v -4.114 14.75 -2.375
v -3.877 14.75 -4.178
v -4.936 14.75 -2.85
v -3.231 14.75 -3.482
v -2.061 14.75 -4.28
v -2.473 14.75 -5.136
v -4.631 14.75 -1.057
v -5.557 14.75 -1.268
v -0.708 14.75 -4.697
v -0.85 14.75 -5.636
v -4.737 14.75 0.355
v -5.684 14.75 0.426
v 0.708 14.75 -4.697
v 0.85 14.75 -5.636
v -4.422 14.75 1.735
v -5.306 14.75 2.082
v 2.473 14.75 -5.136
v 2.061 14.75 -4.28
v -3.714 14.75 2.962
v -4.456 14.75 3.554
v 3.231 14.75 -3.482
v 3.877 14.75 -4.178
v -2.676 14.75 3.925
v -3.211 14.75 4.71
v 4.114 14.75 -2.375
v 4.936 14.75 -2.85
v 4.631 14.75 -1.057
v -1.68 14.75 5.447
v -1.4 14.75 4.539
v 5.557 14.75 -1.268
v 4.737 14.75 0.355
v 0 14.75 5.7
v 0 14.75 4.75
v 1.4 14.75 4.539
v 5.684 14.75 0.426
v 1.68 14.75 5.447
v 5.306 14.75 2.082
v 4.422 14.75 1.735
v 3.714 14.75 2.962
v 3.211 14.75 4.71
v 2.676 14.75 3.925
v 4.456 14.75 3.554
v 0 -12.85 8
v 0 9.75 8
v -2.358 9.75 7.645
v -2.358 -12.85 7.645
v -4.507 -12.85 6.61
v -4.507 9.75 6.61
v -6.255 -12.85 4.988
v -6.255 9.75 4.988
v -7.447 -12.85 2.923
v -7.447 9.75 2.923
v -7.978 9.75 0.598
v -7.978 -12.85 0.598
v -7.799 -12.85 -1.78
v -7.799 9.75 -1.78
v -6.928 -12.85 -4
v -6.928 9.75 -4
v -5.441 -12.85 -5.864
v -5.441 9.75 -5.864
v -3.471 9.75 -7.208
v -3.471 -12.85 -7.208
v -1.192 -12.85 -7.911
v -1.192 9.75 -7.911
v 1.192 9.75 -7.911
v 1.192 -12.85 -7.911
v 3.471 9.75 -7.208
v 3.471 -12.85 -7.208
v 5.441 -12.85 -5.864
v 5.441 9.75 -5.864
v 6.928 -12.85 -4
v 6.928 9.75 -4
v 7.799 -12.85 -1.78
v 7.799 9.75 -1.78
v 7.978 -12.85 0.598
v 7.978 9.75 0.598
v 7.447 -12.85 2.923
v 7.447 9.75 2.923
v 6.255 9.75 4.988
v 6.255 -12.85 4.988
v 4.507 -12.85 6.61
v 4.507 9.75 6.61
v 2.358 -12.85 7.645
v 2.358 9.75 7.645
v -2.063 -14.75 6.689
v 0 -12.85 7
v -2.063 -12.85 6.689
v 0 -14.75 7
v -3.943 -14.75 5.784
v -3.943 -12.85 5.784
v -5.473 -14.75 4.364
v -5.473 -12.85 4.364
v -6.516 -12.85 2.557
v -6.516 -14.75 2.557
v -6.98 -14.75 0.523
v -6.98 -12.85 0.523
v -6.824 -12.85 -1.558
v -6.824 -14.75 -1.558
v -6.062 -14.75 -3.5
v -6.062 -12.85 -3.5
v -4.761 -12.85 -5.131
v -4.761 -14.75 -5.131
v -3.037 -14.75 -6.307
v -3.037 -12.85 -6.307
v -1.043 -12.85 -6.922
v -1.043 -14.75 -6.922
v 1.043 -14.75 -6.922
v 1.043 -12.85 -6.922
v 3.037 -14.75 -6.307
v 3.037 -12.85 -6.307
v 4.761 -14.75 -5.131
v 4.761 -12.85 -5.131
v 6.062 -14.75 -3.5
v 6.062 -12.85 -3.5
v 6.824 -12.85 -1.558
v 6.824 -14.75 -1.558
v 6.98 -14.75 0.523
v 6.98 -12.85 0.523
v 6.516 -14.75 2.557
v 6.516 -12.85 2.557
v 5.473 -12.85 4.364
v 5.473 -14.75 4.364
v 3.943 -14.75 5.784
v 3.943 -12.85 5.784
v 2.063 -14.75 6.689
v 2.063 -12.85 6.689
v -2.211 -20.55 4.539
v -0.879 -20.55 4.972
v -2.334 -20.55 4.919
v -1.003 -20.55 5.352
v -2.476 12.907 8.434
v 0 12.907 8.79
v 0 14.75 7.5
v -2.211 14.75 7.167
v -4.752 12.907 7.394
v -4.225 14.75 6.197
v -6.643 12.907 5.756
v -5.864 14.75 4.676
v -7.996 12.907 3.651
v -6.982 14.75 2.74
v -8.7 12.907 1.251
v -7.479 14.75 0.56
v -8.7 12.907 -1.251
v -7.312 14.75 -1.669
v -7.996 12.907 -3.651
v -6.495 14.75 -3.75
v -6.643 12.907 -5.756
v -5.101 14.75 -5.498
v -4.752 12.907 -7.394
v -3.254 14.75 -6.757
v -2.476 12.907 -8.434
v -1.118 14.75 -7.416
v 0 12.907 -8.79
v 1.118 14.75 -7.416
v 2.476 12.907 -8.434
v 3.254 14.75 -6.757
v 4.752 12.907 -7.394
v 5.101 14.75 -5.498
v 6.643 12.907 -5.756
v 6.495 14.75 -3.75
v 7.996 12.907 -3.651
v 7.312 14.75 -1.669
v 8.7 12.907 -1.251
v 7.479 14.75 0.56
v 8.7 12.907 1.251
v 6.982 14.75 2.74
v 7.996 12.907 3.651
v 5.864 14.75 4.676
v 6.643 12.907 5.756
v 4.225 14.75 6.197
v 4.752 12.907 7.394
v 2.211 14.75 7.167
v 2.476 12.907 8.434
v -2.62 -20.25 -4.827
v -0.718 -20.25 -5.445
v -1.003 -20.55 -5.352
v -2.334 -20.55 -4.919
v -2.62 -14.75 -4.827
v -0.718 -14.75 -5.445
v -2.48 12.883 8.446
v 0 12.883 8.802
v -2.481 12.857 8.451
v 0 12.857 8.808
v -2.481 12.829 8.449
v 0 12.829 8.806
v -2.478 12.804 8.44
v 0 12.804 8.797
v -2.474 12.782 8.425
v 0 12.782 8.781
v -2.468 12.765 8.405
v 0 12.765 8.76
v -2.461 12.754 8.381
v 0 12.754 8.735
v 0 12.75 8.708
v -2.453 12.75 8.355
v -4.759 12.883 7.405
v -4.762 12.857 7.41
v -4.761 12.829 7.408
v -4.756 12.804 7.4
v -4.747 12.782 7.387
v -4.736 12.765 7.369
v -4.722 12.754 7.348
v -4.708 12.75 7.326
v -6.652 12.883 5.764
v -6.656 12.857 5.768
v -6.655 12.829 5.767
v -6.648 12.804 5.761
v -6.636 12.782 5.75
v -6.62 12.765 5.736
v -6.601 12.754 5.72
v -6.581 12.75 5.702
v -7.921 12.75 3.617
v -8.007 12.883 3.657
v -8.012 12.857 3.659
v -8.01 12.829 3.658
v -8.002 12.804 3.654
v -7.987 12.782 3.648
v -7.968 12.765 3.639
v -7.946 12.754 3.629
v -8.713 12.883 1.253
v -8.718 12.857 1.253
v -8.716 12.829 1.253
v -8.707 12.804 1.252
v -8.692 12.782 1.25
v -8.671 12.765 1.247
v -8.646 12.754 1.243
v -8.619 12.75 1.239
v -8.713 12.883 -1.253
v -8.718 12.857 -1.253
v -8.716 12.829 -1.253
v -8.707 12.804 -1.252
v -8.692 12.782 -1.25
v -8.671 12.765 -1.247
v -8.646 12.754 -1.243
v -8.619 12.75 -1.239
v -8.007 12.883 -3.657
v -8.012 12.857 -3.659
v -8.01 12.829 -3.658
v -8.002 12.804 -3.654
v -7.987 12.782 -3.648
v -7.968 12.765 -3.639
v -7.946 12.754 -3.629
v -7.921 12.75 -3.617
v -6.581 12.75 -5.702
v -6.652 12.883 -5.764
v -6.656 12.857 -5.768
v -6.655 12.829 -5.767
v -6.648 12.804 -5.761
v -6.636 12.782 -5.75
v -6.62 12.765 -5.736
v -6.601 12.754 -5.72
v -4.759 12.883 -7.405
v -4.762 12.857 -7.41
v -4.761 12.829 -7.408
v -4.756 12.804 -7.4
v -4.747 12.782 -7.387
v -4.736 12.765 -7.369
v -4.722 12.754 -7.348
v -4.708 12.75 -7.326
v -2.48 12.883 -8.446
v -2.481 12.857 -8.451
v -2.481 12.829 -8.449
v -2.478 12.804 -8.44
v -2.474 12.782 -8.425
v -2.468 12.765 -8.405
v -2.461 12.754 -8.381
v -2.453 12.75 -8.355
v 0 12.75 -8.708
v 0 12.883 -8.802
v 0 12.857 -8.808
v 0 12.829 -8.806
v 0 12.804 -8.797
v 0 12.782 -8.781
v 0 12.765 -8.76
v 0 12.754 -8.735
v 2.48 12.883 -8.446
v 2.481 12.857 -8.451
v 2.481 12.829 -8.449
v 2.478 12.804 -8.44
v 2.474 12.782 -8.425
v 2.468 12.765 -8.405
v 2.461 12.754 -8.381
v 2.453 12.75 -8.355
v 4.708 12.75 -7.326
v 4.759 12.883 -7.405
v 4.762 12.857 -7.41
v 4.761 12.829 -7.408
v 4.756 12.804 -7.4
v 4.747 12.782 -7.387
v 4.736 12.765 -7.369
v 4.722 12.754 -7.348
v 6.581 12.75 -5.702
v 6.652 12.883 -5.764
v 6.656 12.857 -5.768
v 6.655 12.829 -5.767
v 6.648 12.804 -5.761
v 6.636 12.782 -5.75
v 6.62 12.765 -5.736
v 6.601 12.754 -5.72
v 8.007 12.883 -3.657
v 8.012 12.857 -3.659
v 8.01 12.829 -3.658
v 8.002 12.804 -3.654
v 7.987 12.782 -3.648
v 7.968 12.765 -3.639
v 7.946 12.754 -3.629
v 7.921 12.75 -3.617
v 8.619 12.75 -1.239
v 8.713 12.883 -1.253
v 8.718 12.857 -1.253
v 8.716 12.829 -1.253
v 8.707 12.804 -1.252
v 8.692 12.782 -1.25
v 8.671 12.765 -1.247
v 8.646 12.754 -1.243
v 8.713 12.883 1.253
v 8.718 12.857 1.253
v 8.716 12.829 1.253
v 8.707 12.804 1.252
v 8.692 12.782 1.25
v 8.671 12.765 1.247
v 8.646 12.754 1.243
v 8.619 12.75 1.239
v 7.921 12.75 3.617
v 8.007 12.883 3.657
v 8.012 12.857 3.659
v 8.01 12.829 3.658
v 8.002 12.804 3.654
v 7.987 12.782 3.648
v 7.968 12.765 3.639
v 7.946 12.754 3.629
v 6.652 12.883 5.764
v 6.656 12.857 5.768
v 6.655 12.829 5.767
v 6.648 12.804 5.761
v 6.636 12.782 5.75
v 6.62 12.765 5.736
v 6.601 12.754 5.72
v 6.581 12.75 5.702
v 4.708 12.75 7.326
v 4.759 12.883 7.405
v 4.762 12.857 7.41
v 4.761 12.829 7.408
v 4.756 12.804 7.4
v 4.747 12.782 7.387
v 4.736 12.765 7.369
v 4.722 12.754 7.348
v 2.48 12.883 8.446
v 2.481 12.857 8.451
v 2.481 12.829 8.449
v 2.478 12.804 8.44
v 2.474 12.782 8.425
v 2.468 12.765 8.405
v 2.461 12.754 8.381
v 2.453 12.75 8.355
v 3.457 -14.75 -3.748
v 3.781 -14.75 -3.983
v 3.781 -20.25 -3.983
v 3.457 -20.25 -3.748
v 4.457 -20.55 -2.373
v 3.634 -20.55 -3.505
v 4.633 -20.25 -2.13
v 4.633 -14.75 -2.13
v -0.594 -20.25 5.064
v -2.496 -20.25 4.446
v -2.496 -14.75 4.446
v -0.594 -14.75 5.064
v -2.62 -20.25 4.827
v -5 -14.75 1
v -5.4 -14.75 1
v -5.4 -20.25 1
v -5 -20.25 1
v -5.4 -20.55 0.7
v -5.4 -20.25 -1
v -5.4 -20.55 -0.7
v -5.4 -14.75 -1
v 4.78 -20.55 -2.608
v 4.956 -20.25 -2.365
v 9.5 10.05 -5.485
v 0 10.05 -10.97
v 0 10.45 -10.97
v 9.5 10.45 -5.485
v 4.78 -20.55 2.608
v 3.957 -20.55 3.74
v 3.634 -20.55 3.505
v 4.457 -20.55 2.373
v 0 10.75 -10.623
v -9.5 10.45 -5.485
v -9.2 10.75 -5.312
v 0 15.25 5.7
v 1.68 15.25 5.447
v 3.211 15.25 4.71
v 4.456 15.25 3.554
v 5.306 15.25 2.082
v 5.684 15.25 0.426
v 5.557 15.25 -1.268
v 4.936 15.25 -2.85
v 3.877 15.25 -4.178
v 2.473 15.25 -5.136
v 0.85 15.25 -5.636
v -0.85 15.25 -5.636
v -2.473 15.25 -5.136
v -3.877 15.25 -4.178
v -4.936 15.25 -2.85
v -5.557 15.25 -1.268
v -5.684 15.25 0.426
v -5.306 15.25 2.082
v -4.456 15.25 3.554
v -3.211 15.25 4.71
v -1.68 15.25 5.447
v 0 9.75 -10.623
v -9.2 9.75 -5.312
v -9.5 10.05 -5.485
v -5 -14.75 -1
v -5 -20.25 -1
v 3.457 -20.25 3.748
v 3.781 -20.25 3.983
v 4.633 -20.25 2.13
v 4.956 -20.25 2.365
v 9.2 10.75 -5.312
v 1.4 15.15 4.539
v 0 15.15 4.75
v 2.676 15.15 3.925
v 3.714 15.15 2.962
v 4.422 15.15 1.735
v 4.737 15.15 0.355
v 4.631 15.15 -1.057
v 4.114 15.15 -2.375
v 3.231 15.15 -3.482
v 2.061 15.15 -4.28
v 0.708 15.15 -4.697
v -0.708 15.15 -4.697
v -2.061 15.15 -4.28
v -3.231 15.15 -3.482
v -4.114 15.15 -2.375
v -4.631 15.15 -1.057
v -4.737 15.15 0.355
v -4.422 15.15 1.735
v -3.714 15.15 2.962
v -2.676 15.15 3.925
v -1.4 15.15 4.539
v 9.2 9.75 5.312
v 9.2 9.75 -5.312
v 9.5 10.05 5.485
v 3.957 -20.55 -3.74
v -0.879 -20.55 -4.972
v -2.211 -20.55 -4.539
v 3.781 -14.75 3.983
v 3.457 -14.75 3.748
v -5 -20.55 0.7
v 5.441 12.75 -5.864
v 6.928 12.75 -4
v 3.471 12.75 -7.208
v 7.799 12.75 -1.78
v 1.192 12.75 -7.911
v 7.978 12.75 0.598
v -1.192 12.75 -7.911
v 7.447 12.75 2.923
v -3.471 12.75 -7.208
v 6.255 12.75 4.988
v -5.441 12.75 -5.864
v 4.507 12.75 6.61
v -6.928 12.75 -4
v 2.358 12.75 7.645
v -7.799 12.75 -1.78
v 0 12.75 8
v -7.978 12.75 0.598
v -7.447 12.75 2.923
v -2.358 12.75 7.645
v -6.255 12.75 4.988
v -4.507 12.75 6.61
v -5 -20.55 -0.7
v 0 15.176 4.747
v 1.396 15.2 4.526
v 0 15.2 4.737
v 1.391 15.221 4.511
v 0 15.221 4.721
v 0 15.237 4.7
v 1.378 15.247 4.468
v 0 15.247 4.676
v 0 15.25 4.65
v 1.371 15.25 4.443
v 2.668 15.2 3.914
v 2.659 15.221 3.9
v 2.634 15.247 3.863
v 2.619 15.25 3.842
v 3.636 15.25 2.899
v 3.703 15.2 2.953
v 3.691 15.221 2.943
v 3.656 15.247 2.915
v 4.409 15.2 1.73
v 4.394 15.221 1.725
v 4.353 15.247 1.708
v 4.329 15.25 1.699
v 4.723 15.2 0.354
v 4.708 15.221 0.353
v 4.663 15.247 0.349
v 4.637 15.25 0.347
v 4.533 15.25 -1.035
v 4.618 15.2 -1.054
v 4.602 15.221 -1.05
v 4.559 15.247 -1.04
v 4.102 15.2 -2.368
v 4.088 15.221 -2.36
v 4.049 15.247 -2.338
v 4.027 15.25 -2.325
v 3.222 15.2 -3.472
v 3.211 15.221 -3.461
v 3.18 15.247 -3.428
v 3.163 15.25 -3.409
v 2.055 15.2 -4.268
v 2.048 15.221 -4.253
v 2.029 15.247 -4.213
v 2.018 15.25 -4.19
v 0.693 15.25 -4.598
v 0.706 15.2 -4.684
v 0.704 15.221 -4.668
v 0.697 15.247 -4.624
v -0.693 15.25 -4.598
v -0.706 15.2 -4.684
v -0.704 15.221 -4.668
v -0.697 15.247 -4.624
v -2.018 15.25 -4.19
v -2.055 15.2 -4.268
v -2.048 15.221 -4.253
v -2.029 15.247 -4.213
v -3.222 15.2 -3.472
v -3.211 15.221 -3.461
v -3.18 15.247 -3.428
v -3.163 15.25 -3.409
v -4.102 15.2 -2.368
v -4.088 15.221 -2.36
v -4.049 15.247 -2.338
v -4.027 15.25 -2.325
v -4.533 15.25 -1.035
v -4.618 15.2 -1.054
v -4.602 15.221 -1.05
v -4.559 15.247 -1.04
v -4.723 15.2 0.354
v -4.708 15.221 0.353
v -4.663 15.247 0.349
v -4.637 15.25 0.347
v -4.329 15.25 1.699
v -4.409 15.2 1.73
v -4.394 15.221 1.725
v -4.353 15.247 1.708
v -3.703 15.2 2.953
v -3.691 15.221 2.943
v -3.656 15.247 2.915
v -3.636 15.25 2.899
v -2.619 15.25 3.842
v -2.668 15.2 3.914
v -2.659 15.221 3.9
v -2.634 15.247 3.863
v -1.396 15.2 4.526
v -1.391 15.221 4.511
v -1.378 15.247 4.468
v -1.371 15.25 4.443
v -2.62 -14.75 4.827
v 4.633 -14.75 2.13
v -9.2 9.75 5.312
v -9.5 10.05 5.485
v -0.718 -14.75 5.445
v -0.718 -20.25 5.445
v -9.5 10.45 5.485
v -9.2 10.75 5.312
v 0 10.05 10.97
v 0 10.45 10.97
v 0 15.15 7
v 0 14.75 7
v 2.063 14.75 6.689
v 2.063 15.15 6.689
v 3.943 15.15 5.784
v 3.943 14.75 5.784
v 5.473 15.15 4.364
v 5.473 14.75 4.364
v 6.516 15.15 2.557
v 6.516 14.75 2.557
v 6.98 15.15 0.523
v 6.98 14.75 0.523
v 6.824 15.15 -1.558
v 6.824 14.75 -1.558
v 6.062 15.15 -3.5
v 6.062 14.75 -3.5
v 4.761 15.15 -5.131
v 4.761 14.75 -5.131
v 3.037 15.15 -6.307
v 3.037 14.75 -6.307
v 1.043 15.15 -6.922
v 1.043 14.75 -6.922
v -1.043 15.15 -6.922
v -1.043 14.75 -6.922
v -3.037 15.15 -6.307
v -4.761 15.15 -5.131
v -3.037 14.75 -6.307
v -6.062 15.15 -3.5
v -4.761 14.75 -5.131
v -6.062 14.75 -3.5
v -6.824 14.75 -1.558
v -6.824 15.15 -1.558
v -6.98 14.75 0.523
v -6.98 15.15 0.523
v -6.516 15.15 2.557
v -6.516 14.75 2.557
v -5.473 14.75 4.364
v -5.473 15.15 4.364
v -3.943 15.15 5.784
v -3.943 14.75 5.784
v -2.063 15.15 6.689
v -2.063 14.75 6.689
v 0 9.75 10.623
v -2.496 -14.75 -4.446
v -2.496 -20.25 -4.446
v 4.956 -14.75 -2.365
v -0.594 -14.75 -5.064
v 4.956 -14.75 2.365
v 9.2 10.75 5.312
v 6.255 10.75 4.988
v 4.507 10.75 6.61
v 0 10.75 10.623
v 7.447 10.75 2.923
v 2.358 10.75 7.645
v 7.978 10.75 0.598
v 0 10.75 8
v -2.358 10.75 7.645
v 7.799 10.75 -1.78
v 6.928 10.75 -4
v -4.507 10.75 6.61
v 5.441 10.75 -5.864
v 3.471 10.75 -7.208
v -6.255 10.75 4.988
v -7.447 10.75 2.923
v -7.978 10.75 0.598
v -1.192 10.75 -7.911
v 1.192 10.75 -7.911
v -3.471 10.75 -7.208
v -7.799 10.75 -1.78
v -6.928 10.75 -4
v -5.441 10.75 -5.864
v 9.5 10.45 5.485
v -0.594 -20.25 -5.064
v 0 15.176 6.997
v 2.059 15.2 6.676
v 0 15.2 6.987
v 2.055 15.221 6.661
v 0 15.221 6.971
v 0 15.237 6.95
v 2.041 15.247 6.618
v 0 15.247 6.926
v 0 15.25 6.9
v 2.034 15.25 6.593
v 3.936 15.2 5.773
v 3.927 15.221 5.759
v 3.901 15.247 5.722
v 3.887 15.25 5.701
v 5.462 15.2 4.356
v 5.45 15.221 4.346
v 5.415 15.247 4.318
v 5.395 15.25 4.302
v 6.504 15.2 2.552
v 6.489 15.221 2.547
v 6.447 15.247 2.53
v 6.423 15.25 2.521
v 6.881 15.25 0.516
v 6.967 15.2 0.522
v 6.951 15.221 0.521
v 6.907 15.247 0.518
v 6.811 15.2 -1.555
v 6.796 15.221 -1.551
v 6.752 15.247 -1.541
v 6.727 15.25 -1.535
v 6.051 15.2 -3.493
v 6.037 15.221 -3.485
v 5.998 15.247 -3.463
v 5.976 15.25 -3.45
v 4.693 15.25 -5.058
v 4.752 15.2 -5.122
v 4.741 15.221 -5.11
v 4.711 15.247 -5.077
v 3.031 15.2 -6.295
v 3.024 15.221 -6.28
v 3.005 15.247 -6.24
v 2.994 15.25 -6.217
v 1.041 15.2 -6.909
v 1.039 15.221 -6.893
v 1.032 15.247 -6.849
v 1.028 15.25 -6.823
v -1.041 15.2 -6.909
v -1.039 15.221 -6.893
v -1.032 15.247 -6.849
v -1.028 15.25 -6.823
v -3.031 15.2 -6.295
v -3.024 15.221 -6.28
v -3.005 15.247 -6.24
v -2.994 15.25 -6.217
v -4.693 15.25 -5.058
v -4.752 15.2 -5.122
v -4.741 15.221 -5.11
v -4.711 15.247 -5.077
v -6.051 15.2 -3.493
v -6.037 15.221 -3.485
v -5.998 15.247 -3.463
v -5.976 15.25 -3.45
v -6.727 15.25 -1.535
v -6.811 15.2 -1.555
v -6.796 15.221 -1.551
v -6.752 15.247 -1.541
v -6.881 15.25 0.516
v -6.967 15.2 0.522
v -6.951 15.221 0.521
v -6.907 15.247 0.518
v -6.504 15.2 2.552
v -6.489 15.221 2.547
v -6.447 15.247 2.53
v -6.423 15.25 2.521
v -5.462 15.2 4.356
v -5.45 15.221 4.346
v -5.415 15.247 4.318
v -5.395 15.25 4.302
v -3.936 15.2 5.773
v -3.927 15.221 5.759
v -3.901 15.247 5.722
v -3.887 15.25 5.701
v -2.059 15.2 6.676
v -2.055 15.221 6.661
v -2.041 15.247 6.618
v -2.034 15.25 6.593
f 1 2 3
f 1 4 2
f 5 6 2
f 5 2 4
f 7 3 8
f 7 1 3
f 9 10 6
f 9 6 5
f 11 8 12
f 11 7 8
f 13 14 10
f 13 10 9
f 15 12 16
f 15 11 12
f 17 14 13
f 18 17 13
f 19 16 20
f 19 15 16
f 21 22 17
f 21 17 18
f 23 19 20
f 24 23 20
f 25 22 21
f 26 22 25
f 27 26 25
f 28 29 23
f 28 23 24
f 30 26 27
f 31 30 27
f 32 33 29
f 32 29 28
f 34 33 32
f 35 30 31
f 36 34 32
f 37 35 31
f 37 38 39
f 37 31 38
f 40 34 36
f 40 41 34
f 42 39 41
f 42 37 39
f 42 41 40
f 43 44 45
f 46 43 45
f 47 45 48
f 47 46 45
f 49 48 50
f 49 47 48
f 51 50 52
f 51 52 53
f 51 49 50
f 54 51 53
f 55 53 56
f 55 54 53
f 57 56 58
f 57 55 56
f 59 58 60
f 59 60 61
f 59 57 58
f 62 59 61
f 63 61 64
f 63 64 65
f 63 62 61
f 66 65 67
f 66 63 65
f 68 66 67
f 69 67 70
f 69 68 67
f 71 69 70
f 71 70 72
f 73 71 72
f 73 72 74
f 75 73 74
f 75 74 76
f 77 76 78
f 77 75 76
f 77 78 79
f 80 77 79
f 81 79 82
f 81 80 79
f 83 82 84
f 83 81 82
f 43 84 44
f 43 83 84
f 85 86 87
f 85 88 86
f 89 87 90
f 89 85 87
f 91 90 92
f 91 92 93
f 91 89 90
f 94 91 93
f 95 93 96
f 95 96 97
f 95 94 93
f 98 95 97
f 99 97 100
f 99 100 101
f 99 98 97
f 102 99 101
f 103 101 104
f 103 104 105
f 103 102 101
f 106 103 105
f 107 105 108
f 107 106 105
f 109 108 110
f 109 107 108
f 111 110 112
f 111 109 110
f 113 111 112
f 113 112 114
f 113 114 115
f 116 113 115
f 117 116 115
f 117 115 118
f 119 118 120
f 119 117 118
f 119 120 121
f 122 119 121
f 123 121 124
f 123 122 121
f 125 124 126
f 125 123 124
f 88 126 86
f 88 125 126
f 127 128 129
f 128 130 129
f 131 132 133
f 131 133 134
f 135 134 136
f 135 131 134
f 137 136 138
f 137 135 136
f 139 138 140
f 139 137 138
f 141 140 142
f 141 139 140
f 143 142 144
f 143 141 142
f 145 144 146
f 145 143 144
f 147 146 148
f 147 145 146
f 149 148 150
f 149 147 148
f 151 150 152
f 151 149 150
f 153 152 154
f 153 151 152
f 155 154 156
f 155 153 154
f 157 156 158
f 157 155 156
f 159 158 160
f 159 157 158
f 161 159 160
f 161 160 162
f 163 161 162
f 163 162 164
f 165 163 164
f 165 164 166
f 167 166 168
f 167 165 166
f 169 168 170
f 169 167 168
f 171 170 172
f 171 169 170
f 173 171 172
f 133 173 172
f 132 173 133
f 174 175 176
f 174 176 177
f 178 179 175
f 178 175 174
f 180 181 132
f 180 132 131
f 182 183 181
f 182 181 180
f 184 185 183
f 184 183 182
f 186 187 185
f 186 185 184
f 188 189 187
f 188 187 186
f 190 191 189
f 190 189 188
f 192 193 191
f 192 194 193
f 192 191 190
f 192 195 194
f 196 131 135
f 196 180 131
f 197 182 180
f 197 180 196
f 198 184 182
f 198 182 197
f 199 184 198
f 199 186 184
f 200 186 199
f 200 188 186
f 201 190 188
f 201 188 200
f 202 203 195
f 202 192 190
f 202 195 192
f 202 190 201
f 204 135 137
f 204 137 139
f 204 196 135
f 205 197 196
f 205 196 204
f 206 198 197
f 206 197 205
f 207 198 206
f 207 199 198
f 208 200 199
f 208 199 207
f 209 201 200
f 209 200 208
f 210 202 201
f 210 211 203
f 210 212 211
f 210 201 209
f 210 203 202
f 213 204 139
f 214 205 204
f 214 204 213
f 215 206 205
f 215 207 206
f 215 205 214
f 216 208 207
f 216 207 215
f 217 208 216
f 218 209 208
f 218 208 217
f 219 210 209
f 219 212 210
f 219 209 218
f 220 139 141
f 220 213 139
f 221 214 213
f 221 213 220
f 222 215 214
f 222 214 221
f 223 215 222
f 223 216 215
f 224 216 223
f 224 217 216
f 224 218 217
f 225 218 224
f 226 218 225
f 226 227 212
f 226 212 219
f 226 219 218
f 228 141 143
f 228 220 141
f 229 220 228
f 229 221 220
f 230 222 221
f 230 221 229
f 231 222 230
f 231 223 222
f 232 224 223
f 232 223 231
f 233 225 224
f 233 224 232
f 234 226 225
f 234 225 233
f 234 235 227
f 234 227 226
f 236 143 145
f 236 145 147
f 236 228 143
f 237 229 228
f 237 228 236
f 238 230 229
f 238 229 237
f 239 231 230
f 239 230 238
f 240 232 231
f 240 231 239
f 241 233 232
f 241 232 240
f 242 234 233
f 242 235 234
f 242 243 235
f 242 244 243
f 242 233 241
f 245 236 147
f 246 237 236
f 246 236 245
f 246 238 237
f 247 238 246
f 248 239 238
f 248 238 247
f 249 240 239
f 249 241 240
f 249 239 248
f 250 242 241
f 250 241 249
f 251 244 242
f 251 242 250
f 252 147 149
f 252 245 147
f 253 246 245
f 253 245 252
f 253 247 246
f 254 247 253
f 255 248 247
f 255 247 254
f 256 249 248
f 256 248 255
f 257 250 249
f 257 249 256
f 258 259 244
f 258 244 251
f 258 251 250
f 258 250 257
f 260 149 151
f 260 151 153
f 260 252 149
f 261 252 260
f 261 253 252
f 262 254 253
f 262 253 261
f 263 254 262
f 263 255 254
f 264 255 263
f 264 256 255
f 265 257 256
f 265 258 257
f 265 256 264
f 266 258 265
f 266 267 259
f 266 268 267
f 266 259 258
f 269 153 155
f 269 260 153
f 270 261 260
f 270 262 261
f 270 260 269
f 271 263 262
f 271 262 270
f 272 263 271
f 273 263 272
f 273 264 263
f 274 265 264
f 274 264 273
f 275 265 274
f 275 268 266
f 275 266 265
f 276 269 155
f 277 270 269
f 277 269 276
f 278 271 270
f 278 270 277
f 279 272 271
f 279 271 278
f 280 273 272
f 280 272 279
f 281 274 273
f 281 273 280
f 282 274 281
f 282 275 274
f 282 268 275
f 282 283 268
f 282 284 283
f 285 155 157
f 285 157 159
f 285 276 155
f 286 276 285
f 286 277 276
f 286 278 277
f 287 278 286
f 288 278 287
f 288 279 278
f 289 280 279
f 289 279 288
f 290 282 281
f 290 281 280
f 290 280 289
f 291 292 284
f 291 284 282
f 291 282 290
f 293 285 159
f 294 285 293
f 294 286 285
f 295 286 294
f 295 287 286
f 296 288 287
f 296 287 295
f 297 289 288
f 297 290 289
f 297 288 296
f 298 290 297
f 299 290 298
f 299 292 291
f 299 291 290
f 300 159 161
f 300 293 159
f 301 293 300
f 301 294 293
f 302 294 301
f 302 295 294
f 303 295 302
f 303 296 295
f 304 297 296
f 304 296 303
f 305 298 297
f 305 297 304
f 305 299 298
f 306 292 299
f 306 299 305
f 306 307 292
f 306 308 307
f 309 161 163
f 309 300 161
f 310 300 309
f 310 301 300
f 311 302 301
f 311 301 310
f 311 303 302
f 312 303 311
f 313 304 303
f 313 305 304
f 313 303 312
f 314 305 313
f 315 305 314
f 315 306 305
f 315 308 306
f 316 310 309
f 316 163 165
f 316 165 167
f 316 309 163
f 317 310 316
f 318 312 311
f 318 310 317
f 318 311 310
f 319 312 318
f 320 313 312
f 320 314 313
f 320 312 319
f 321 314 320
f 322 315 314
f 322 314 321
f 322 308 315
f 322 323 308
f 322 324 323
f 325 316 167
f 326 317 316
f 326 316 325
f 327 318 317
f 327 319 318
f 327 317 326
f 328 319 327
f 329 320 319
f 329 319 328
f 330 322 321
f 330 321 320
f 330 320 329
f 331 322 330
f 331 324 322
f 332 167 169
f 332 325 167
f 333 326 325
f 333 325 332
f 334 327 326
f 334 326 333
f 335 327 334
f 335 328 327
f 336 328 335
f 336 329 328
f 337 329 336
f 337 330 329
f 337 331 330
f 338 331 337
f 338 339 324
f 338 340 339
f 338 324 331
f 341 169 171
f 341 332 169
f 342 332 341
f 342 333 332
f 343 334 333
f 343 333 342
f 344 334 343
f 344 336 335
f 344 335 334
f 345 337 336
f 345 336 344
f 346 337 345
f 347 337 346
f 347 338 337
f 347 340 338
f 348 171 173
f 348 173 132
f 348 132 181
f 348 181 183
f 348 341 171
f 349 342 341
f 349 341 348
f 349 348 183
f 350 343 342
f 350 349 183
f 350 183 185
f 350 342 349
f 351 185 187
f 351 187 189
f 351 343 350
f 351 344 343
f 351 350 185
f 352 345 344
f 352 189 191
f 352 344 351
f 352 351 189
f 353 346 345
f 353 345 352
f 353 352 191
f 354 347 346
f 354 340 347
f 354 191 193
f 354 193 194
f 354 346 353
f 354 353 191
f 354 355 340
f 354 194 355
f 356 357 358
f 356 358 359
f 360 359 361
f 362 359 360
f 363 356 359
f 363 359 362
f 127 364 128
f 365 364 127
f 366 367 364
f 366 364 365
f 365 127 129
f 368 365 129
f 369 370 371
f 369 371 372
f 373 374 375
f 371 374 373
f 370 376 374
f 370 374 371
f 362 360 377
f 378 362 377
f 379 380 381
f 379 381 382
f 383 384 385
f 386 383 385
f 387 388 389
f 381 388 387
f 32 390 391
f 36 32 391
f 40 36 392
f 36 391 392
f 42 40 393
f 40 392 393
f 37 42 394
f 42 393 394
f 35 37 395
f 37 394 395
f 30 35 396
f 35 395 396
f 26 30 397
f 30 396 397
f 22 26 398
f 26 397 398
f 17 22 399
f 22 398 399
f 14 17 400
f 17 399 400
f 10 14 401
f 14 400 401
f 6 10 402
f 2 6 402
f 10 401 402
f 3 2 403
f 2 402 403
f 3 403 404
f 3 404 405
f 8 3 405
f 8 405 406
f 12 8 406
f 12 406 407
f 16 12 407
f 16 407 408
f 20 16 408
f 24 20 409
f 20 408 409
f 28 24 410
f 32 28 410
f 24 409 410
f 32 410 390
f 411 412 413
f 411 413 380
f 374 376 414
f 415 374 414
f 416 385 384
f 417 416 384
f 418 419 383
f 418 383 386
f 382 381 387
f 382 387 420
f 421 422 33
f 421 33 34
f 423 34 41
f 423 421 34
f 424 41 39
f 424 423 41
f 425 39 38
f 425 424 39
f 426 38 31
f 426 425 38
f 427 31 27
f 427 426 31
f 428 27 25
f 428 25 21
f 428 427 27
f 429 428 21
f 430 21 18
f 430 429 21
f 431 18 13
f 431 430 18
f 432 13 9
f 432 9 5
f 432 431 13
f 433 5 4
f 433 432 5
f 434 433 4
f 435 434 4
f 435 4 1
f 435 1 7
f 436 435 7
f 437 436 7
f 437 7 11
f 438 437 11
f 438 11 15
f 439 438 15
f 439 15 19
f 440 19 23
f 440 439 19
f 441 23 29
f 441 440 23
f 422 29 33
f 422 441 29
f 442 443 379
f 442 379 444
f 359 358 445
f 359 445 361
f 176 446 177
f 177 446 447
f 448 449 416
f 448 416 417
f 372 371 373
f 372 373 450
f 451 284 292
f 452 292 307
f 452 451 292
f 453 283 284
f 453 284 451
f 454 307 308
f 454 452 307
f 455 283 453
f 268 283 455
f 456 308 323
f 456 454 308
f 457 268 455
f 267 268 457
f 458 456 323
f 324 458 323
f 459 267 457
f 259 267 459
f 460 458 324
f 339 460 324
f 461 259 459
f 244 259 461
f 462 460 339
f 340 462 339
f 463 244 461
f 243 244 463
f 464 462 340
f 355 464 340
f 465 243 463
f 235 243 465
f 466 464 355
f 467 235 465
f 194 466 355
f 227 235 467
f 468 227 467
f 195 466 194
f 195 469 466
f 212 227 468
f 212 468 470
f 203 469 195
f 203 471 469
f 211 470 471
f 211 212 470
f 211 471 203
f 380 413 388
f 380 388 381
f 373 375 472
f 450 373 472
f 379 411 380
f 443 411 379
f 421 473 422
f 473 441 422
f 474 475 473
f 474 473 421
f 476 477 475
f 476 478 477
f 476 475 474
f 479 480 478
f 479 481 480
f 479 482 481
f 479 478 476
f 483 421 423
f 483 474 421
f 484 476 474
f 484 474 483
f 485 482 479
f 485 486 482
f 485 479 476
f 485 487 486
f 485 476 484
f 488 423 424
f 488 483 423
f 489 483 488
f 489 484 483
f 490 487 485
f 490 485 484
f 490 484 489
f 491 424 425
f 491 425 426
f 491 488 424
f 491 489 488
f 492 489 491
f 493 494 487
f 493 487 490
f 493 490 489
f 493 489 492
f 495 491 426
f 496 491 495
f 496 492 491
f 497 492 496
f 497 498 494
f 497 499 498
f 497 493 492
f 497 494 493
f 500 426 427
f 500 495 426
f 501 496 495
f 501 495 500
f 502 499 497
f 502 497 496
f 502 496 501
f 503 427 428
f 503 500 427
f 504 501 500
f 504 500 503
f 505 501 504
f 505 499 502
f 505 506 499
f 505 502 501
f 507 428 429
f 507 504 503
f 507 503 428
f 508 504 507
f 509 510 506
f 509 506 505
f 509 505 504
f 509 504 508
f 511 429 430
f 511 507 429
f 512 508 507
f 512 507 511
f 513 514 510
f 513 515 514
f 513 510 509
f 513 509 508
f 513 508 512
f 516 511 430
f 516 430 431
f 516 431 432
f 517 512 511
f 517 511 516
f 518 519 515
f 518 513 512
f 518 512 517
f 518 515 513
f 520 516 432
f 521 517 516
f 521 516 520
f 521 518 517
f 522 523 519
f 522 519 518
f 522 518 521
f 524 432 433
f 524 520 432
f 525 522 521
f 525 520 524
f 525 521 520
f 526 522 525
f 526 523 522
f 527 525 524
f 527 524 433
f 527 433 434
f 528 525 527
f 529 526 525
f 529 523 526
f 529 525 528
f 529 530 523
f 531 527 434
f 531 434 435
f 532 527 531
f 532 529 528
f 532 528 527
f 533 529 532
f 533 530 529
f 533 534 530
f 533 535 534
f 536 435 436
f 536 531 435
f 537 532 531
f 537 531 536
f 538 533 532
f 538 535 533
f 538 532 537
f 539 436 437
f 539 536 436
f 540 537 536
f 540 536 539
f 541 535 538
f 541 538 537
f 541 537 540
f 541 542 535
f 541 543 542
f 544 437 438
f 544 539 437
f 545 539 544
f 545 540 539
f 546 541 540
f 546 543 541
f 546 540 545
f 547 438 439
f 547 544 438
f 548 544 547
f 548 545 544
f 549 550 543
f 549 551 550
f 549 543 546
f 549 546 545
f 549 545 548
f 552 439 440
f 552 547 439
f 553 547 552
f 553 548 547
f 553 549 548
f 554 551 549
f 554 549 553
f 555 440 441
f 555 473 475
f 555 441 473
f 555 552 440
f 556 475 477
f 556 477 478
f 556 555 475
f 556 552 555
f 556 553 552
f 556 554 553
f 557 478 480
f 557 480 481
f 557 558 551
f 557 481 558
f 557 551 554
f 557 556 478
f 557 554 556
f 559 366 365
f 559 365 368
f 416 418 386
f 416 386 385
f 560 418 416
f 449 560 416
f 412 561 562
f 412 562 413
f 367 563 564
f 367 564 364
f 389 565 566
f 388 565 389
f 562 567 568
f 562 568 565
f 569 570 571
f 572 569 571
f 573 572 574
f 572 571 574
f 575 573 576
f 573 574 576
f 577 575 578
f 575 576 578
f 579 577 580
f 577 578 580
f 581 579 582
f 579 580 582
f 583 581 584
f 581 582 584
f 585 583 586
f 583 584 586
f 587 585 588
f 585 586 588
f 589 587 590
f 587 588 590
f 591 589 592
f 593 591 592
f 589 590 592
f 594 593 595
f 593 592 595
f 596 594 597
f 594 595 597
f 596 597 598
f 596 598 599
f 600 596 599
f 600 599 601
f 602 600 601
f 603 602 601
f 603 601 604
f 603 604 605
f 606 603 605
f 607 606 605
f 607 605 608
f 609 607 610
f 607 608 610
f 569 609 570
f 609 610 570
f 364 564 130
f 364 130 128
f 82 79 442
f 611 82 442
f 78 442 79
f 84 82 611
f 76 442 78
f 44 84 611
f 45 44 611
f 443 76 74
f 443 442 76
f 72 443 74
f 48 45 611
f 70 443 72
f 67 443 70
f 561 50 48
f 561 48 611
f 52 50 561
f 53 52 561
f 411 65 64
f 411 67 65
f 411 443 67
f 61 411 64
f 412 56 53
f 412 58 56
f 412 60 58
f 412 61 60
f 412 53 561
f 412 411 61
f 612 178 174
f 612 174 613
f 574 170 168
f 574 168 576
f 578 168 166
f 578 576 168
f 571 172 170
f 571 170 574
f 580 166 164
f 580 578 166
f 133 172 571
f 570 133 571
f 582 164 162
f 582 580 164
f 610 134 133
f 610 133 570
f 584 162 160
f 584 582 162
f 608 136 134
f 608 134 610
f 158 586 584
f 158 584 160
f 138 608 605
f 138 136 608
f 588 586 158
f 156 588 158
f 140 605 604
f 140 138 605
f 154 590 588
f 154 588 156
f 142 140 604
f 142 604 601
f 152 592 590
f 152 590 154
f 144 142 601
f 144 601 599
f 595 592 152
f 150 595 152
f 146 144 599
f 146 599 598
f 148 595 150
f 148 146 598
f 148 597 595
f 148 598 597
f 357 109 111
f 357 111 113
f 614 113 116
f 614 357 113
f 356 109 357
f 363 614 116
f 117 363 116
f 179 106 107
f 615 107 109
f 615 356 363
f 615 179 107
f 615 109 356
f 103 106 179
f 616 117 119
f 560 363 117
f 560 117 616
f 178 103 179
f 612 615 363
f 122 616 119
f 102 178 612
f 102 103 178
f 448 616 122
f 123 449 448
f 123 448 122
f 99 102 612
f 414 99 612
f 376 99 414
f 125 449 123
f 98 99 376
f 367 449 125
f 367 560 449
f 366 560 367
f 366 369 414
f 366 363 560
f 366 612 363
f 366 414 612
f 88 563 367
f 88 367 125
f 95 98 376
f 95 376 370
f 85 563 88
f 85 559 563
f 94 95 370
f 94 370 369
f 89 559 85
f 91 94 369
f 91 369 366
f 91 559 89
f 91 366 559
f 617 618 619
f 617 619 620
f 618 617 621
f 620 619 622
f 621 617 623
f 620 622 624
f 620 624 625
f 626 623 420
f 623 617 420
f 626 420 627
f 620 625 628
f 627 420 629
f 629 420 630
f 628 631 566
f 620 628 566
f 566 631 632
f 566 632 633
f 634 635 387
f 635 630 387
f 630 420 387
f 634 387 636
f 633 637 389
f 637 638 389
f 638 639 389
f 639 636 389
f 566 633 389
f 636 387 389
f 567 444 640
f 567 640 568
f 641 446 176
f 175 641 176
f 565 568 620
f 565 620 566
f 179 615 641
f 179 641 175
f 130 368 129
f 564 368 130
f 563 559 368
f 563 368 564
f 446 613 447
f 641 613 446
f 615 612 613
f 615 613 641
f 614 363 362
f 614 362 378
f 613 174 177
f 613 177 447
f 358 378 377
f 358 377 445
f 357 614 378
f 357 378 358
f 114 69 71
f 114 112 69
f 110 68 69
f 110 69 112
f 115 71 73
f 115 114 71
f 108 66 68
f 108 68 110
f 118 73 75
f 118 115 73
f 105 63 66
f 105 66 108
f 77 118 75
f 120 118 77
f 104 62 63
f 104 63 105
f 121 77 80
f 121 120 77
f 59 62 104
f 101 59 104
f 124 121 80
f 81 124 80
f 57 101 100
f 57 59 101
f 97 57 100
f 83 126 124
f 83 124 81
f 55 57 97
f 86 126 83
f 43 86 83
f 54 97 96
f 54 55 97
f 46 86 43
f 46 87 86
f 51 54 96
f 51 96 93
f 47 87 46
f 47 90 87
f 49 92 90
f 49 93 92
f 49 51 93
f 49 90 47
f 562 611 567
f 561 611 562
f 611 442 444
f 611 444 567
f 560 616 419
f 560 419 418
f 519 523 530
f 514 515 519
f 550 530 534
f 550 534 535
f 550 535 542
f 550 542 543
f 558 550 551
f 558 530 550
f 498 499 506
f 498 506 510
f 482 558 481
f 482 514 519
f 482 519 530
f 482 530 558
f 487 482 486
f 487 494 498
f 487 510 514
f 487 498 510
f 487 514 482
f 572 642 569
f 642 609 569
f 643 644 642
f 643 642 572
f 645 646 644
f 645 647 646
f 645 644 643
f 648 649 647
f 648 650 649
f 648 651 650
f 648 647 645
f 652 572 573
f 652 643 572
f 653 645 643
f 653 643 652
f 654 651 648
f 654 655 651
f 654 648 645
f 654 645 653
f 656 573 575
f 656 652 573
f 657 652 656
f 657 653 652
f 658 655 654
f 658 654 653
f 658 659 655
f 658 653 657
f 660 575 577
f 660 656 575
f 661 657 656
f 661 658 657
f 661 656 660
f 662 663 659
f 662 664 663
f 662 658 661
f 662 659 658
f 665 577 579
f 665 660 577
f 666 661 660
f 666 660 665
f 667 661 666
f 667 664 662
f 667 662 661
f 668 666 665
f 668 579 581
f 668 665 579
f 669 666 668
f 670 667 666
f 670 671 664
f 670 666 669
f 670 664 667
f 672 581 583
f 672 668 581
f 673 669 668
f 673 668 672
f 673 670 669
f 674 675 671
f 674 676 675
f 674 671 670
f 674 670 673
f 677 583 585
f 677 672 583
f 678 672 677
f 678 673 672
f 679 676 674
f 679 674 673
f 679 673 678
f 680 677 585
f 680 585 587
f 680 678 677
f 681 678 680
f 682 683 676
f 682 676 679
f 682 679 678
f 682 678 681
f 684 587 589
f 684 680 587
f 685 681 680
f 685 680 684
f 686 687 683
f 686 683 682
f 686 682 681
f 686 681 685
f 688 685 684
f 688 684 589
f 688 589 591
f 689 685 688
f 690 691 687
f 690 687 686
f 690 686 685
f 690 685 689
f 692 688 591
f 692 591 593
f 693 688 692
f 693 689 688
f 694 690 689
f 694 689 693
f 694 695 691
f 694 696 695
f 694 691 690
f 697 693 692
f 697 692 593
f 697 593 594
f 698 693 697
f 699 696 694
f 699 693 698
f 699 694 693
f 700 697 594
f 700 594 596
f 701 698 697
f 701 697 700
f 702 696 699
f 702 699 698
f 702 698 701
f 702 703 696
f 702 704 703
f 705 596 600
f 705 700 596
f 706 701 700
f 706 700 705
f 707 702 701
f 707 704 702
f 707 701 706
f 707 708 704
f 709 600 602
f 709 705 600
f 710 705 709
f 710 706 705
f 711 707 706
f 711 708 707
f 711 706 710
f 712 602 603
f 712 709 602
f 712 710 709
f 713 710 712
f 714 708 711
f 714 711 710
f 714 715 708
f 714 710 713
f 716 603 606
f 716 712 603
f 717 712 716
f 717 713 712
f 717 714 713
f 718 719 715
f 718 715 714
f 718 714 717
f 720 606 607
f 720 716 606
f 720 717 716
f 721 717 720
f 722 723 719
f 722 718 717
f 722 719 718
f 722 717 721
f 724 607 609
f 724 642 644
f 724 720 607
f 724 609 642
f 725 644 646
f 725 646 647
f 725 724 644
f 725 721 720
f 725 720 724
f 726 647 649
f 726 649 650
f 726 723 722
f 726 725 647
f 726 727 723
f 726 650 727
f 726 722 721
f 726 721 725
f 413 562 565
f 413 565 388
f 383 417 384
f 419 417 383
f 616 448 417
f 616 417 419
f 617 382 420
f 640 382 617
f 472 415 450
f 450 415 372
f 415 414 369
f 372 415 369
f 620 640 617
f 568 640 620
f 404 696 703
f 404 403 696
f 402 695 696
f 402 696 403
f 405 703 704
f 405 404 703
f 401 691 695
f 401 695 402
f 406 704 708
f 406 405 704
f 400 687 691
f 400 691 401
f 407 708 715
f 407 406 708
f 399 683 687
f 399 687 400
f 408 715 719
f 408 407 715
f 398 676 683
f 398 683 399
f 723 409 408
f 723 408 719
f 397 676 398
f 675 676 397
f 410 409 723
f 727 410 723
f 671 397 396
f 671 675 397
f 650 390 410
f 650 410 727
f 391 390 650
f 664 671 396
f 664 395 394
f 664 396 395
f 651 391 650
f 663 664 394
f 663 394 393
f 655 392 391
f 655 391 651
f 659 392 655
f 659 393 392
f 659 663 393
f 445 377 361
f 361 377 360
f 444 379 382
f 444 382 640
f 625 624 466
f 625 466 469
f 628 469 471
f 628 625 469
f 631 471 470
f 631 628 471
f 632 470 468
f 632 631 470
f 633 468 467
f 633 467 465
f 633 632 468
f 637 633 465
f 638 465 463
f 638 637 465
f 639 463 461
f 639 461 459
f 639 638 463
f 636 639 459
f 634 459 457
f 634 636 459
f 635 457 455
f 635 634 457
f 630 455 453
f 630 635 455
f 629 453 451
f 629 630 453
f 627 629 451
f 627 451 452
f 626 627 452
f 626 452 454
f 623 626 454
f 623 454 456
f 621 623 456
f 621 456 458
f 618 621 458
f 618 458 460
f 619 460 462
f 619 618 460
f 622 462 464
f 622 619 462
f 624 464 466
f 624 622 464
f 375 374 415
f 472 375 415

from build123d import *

# Parameters (mm, degrees)
SKETCH2_W           = 0.4
SKETCH2_H           = 2
BOSS_EXTRUDE1_DEPTH = 5.8
CHAMFER1_SIZE       = 0.3
SKETCH3_R           = 7
BOSS_EXTRUDE2_DEPTH = 0.5
SKETCH4_R           = 5.7
SKETCH4_R_2         = 4.75
CUT_EXTRUDE1_DEPTH  = 0.5
FILLET1_R           = 0.1
FILLET2_R           = 0.1
BOSS_EXTRUDE3_START = 1
SKETCH5_R           = 8
BOSS_EXTRUDE3_DEPTH = 1
CHAMFER2_SIZE       = 0.3


with BuildPart() as part:
    # Sketch1 → Revolve1 (revolve)
    with BuildSketch(Plane.XY, mode=Mode.PRIVATE) as revolve1_sk:
        Polygon((0, 14.75), (-7.5, 14.75), (-8.9, 12.75), (-8, 12.75), (-8, -12.85), (-7, -12.85), (-7, -14.75), (0, -14.75), align=None)
    revolve(revolve1_sk.sketch.rotate(Axis((0, 14.75, 0), (0, -1, 0)), 270), axis=Axis((0, 14.75, 0), (0, -1, 0)))

    # Sketch2 → Boss-Extrude1 (add)
    with BuildSketch(Plane.XZ.offset(14.75)):
        with Locations((-5.2, 0)):
            Rectangle(SKETCH2_W, SKETCH2_H)
        Polygon((-0.717635253, 5.444722182), (-0.594028456, 5.064299576), (-2.496141488, 4.446265587), (-2.619748286, 4.826688194), align=None)
        Polygon((4.956477022, 2.365023368), (4.632870224, 2.129909267), (3.45729972, 3.747943256), (3.780906517, 3.983057357), align=None)
        Polygon((3.780906517, -3.983057357), (3.45729972, -3.747943256), (4.632870224, -2.129909267), (4.956477022, -2.365023368), align=None)
        Polygon((-2.619748286, -4.826688194), (-2.496141488, -4.446265587), (-0.594028456, -5.064299576), (-0.717635253, -5.444722182), align=None)
    extrude(amount=BOSS_EXTRUDE1_DEPTH)

    # Chamfer1
    chamfer1_edges = [part.edges().sort_by_distance(p)[0] for p in [
        (-5.2, -20.55, -1),
        (-5.2, -20.55, 1),
        (-2.557944887, -20.55, 4.63647689),
        (-0.655831854, -20.55, 5.254510879),
        (3.619103118, -20.55, 3.865500306),
        (4.794673623, -20.55, 2.247466318),
        (4.794673623, -20.55, -2.247466318),
        (3.619103118, -20.55, -3.865500306),
        (-0.655831854, -20.55, -5.254510879),
        (-2.557944887, -20.55, -4.63647689),
    ]]
    chamfer(chamfer1_edges, length=CHAMFER1_SIZE)

    # Sketch3 → Boss-Extrude2 (add)
    with BuildSketch(Plane(origin=(0, 14.75, 0), x_dir=(1, 0, 0), z_dir=(0, 1, 0))):
        with Locations(Location((0, 0, 0), (0, 0, 270))):
            Circle(SKETCH3_R)
    extrude(amount=BOSS_EXTRUDE2_DEPTH)

    # Sketch4 → Cut-Extrude1 (cut)
    with BuildSketch(Plane(origin=(0, 15.25, 0), x_dir=(1, 0, 0), z_dir=(0, 1, 0))):
        with Locations(Location((0, 0, 0), (0, 0, 270))):
            Circle(SKETCH4_R)
        with Locations(Location((0, 0, 0), (0, 0, 270))):
            Circle(SKETCH4_R_2, mode=Mode.SUBTRACT)
    extrude(amount=-CUT_EXTRUDE1_DEPTH, mode=Mode.SUBTRACT)

    # Fillet1
    fillet1_edges = [part.edges().sort_by_distance(p)[0] for p in [
        (0, 15.25, -7),
        (0, 15.25, -4.75),
    ]]
    fillet(fillet1_edges, radius=FILLET1_R)

    # Fillet2
    fillet2_edges = [part.edges().sort_by_distance(p)[0] for p in [
        (0, 12.75, -8.9),
    ]]
    fillet(fillet2_edges, radius=FILLET2_R)

    # Sketch5 → Boss-Extrude3 (add)
    with BuildSketch(Plane(origin=(0, 10.75, 0), x_dir=(-1, 0, 0), z_dir=(0, -1, 0)).offset(BOSS_EXTRUDE3_START)):
        Polygon((0, 10.969655115), (-9.5, 5.484827557), (-9.5, -5.484827557), (0, -10.969655115), (9.5, -5.484827557), (9.5, 5.484827557), align=None)
        with Locations(Location((0, 0, 0), (0, 0, 270))):
            Circle(SKETCH5_R, mode=Mode.SUBTRACT)
    extrude(amount=-BOSS_EXTRUDE3_DEPTH)

    # Chamfer2
    chamfer2_edges = [part.edges().sort_by_distance(p)[0] for p in [
        (-4.75, 9.75, -8.227241336),
        (4.75, 9.75, -8.227241336),
        (9.5, 9.75, 0),
        (4.75, 9.75, 8.227241336),
        (-4.75, 9.75, 8.227241336),
        (-9.5, 9.75, 0),
        (-4.75, 10.75, -8.227241336),
        (4.75, 10.75, -8.227241336),
        (9.5, 10.75, 0),
        (4.75, 10.75, 8.227241336),
        (-4.75, 10.75, 8.227241336),
        (-9.5, 10.75, 0),
    ]]
    chamfer(chamfer2_edges, length=CHAMFER2_SIZE)


solid = part.part
